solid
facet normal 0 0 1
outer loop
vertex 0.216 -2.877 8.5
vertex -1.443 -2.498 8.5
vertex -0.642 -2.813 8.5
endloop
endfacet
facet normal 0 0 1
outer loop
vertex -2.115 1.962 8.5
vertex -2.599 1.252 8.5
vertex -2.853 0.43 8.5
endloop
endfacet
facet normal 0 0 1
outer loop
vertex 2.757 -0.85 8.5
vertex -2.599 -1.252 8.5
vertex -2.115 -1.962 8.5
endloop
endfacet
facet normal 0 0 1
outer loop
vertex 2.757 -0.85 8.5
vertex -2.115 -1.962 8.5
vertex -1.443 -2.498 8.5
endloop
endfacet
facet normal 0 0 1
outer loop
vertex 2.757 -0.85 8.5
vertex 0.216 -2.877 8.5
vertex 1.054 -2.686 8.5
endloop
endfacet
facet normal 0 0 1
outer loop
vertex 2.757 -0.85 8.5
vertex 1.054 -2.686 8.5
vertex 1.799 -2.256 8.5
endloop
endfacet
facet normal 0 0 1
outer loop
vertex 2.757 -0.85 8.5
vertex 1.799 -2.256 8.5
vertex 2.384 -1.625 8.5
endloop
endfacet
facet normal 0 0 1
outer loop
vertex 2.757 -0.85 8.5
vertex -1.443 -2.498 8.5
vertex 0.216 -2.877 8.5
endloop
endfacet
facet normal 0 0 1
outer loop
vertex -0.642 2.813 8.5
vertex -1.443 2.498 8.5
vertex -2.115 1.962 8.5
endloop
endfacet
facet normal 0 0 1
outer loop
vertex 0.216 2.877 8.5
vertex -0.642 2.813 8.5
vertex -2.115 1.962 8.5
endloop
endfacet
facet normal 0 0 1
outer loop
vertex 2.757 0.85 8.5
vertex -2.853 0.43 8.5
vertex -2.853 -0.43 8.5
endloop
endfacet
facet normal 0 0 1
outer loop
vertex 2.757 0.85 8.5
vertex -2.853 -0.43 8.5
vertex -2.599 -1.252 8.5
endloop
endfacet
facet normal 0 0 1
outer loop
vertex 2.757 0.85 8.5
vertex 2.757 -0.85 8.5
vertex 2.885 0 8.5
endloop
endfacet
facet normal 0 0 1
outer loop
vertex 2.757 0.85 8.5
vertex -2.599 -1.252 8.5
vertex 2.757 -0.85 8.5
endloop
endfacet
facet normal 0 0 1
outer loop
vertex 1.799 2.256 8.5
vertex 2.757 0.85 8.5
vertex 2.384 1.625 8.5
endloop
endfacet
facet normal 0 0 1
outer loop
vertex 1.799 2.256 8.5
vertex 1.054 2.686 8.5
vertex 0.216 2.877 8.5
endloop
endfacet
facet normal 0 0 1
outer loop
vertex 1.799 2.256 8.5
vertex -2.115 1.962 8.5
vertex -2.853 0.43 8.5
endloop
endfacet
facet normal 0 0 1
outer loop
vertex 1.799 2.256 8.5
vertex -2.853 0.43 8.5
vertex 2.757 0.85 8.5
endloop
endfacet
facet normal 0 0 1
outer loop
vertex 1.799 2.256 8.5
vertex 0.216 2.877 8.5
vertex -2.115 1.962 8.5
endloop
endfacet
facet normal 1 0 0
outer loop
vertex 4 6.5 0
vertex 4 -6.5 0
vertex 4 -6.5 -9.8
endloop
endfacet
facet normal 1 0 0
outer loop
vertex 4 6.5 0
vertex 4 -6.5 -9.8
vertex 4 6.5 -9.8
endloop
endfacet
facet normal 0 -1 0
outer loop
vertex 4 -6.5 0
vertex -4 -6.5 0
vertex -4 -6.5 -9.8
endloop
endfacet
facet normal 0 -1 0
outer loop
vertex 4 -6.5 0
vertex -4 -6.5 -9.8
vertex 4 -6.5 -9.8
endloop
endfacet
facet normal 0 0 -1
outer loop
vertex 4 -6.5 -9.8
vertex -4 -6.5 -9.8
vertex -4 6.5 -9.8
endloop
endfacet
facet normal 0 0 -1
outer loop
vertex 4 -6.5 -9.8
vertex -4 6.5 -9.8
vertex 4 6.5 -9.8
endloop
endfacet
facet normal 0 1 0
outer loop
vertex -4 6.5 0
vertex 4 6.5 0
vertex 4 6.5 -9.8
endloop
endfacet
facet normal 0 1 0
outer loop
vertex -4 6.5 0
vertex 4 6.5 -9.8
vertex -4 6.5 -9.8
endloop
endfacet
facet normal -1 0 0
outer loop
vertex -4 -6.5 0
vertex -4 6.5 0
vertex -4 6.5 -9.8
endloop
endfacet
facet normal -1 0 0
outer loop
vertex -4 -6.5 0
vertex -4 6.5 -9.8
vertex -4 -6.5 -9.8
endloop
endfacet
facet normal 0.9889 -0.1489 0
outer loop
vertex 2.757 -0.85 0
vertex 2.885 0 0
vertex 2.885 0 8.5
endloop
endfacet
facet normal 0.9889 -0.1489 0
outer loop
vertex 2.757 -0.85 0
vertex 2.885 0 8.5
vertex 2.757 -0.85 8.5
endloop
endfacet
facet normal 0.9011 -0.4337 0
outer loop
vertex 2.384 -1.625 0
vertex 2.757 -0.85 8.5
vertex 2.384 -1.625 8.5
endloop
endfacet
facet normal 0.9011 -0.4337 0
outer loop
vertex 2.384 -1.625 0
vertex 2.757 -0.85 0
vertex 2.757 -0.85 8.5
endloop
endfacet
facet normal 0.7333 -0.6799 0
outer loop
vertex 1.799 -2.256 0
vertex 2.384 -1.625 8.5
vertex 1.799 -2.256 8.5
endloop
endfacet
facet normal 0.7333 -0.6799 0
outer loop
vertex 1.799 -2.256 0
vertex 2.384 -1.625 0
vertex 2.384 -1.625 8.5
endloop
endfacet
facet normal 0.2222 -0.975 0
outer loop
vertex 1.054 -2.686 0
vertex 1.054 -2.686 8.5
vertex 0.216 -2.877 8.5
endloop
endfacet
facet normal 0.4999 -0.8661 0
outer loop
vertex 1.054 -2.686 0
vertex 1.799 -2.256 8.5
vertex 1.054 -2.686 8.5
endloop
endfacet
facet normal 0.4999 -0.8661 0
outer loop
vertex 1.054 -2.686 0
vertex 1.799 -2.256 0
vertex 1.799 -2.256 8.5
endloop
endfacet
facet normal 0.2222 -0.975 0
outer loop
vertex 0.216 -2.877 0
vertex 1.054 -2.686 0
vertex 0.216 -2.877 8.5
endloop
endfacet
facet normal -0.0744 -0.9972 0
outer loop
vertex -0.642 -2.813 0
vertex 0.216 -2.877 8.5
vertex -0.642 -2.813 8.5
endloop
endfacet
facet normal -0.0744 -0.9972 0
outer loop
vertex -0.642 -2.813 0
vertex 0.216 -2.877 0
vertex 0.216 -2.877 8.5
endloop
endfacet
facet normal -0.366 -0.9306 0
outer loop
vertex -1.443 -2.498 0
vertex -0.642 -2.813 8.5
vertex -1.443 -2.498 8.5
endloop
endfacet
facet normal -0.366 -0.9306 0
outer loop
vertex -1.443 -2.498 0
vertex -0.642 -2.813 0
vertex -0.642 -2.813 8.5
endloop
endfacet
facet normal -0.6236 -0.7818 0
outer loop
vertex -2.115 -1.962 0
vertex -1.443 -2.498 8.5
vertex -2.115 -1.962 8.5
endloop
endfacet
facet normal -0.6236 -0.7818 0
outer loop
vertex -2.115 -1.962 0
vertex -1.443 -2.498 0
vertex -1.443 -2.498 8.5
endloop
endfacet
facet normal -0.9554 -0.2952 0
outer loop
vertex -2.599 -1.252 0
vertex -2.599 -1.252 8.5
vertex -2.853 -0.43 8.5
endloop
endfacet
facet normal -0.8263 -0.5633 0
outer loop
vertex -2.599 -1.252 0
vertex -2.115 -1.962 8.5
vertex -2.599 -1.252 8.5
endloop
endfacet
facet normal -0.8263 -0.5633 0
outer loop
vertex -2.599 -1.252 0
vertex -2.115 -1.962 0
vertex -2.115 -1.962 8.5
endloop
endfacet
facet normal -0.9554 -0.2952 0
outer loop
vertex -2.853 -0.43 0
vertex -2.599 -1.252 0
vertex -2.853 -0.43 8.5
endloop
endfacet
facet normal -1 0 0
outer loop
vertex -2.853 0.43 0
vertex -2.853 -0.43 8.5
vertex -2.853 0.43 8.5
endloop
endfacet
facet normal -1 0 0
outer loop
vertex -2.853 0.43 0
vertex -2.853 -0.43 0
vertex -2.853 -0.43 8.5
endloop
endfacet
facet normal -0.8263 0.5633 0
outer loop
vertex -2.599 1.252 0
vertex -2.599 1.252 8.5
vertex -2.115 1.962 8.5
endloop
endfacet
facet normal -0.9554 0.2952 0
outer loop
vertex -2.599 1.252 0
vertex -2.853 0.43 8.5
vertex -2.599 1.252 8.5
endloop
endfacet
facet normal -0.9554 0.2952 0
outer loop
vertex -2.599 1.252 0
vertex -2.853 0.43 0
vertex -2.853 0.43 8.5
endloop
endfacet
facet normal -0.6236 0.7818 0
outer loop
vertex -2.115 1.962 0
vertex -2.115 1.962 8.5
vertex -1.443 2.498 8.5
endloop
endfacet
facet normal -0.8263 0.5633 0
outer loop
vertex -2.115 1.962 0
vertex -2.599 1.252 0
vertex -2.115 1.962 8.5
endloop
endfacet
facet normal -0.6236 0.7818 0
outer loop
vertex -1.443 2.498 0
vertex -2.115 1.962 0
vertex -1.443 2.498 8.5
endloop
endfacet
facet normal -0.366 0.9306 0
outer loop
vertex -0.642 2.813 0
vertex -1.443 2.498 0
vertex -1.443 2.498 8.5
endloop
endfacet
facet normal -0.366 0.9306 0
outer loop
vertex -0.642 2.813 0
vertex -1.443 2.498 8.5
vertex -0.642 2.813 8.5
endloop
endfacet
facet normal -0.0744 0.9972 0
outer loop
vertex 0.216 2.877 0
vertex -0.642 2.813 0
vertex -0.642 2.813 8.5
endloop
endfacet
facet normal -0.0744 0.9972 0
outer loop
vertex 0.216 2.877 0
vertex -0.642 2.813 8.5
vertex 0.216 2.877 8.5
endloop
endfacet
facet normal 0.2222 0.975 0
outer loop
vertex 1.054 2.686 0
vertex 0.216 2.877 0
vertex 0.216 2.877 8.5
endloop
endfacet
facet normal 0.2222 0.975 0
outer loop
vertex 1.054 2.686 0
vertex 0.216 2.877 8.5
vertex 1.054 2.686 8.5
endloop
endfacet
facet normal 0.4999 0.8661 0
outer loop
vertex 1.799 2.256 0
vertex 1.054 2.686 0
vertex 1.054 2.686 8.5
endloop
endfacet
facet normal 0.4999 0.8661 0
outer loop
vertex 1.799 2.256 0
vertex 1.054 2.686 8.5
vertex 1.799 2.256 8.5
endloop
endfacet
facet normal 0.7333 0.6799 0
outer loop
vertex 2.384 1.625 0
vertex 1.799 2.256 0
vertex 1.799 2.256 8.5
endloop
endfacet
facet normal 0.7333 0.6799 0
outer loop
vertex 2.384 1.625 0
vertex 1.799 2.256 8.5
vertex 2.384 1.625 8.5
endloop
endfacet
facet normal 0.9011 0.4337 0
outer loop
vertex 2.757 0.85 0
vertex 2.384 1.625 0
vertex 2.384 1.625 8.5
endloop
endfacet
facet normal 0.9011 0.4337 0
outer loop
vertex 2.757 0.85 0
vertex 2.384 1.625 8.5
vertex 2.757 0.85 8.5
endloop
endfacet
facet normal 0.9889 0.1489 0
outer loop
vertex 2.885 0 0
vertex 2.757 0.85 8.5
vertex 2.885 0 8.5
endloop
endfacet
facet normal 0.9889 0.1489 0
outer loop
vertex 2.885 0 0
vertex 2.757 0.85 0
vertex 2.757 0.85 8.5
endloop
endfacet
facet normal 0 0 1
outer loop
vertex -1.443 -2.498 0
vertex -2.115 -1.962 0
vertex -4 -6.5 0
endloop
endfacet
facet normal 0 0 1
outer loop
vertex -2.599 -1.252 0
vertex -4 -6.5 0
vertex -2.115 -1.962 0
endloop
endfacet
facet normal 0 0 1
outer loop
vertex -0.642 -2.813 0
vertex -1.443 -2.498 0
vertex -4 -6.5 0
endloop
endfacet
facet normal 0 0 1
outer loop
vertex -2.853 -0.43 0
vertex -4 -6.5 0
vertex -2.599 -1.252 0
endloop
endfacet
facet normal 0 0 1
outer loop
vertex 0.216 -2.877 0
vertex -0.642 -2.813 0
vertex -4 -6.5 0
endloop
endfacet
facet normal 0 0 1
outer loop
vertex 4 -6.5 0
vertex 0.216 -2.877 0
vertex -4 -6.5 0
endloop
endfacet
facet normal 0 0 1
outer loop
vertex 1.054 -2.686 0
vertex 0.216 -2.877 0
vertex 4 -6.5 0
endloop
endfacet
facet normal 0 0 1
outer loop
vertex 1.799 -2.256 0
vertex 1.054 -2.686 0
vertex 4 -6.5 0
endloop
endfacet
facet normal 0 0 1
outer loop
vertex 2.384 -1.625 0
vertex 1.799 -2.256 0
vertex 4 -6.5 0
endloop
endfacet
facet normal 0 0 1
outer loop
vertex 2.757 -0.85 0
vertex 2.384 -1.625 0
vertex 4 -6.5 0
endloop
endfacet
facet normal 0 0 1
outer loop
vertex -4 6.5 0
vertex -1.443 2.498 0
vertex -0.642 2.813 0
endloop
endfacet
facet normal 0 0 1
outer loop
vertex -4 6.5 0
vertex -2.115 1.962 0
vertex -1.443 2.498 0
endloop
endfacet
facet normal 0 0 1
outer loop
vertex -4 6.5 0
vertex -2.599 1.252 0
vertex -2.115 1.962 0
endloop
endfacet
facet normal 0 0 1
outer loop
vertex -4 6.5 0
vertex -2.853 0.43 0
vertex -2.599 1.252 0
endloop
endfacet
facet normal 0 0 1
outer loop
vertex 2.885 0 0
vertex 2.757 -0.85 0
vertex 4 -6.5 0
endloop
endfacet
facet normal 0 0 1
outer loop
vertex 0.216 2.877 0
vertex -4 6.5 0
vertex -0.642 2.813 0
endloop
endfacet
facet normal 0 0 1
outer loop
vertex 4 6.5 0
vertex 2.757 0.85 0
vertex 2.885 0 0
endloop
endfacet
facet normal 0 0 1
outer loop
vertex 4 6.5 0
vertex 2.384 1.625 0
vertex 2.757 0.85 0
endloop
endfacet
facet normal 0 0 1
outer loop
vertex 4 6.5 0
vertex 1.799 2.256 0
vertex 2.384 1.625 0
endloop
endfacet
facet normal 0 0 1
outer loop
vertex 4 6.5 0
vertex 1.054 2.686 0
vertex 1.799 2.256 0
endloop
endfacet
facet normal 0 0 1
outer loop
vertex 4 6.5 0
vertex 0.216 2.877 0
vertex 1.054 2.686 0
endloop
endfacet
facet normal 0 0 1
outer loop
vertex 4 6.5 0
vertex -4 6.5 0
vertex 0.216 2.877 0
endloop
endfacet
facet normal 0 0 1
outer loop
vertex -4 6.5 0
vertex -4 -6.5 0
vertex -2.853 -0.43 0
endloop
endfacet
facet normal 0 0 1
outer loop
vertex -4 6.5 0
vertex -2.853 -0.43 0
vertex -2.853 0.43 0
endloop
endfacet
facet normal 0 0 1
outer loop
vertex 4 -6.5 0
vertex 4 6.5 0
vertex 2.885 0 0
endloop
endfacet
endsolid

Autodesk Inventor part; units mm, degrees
ref_plane "YZ Plane" through (0, 0, 0) normal (1, 0, 0) x (0, 1, 0)
ref_plane "XZ Plane" through (0, 0, 0) normal (0, 1, 0) x (-1, 0, 0)
ref_plane "XY Plane" through (0, 0, 0) normal (0, 0, 1) x (1, 0, 0)
sketch "Sketch1" plane through (0, 0, 0) normal (0, 0, 1) x (1, 0, 0)
  line L0 (-4, -6.5) -> (4, -6.5)
  line L1 (4, -6.5) -> (4, 6.5)
  line L2 (4, 6.5) -> (-4, 6.5)
  line L3 (-4, 6.5) -> (-4, -6.5)
  line L4 (-4, -6.5) -> (4, 6.5) construction
  line L5 (4, -6.5) -> (-4, 6.5) construction
  point P0 (0, 0)
  dimension "d0" = 13
  dimension "d1" = 8
extrude "Extrusion1" add sketch "Sketch1" against normal blind 9.8
sketch "Sketch2" plane through (0, 0, 0) normal (0, 0, 1) x (1, 0, 0)
  circle A0 centre (0, 0) radius 2.885
  dimension "d4" = 5.77
extrude "Extrusion2" add sketch "Sketch2" along normal blind 8.5
properties part number "switch"
